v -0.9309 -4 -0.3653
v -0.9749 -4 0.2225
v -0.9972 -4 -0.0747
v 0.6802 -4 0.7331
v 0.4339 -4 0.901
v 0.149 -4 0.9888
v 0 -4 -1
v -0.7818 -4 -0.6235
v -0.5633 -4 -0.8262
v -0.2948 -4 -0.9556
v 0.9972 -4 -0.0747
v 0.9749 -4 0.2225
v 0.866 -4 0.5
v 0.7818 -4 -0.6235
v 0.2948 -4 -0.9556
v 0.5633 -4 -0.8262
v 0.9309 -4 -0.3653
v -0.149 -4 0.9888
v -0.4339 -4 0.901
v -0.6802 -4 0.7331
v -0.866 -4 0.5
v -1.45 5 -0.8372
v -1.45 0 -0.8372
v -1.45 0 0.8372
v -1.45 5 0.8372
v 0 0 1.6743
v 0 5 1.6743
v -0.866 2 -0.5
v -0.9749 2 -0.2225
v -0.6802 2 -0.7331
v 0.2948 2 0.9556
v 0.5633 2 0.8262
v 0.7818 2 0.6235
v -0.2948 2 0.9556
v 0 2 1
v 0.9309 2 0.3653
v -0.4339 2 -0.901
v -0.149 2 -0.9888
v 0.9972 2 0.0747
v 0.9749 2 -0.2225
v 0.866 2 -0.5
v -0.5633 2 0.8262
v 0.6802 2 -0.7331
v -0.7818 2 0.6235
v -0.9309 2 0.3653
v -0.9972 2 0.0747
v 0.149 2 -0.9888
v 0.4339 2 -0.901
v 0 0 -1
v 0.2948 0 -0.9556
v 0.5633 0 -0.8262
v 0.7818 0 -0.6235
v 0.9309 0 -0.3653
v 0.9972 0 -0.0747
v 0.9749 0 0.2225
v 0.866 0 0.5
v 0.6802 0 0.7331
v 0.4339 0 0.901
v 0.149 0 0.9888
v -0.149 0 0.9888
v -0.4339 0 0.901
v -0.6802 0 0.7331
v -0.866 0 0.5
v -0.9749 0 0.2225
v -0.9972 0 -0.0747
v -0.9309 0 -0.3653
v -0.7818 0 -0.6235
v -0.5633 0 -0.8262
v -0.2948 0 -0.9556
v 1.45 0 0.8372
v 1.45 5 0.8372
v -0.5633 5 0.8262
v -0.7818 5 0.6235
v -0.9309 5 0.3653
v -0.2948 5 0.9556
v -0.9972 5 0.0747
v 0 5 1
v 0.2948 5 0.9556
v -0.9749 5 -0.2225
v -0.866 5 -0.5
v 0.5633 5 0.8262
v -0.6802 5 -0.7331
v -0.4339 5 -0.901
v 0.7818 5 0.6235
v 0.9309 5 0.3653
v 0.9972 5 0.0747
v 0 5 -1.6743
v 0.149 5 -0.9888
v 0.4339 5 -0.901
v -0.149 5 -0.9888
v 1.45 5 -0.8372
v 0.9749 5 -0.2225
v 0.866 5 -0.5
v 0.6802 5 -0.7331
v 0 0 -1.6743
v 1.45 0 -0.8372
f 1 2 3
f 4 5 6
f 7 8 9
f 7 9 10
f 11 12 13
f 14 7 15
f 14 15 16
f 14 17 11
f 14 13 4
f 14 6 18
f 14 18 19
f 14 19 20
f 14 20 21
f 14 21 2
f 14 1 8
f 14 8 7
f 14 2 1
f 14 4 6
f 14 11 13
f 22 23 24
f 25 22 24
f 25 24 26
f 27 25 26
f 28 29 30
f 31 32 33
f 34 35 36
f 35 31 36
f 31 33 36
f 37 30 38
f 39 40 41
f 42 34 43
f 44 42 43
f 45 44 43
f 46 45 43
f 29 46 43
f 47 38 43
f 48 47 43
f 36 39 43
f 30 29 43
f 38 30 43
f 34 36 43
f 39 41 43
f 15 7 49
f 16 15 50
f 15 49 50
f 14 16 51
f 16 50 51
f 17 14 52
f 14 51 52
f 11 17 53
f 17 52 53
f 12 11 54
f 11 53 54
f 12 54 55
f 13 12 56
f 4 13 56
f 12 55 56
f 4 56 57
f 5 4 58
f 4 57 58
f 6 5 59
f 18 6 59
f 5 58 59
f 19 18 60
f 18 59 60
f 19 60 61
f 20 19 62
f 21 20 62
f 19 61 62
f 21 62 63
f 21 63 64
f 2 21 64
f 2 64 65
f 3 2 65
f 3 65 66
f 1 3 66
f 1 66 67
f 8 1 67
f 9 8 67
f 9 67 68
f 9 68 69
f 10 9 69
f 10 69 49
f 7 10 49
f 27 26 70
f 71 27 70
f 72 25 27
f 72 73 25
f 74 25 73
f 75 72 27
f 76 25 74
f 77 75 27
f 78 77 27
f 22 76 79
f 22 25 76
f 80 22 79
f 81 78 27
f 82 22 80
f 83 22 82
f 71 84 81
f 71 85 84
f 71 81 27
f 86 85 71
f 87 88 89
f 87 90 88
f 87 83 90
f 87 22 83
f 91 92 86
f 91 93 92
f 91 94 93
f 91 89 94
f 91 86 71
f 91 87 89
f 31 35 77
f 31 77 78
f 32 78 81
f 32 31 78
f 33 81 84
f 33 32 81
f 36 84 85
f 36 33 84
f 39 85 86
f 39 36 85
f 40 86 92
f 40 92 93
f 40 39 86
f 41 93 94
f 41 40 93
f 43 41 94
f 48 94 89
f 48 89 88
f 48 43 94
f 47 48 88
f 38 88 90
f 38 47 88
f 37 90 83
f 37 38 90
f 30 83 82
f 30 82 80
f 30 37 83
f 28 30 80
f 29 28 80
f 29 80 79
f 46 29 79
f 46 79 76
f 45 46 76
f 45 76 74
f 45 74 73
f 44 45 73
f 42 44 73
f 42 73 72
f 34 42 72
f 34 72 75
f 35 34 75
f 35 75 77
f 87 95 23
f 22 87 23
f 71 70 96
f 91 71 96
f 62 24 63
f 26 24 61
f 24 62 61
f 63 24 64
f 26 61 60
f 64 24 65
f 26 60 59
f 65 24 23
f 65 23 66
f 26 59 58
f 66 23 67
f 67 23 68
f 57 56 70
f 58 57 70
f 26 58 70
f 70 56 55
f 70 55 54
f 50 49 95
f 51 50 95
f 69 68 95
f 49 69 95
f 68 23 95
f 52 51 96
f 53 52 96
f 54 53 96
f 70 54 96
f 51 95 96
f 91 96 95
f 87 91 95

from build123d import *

# Parameters (mm, degrees)
SKETCH_1_R           = 1
EXTRUDE_1_DEPTH      = 5
EXTRUDE_2_DEPTH      = 4
EXTRUDE_2_DEPTH_BACK = 2
SKETCH_2_R           = 1


with BuildPart() as part:
    # 草图1 → 凸台-拉伸1 (new body)
    with BuildSketch(Plane(origin=(0, 0, 0), x_dir=(1, 0, 0), z_dir=(0, 1, 0))):
        Polygon((0, 1.674315781), (-1.45, 0.83715789), (-1.45, -0.83715789), (0, -1.674315781), (1.45, -0.83715789), (1.45, 0.83715789), align=None)
        with Locations(Location((0, 0, 0), (0, 0, 270))):
            Circle(SKETCH_1_R, mode=Mode.SUBTRACT)
    extrude(amount=EXTRUDE_1_DEPTH)

    # 草图2 → 凸台-拉伸2 (add, two sides: drawn at the far end of the back side and taken through both)
    with BuildSketch(Plane.XZ.offset(-EXTRUDE_2_DEPTH_BACK)):
        with Locations(Location((0, 0, 0), (0, 0, 270))):
            Circle(SKETCH_2_R)
    extrude(amount=EXTRUDE_2_DEPTH + EXTRUDE_2_DEPTH_BACK)


solid = part.part
